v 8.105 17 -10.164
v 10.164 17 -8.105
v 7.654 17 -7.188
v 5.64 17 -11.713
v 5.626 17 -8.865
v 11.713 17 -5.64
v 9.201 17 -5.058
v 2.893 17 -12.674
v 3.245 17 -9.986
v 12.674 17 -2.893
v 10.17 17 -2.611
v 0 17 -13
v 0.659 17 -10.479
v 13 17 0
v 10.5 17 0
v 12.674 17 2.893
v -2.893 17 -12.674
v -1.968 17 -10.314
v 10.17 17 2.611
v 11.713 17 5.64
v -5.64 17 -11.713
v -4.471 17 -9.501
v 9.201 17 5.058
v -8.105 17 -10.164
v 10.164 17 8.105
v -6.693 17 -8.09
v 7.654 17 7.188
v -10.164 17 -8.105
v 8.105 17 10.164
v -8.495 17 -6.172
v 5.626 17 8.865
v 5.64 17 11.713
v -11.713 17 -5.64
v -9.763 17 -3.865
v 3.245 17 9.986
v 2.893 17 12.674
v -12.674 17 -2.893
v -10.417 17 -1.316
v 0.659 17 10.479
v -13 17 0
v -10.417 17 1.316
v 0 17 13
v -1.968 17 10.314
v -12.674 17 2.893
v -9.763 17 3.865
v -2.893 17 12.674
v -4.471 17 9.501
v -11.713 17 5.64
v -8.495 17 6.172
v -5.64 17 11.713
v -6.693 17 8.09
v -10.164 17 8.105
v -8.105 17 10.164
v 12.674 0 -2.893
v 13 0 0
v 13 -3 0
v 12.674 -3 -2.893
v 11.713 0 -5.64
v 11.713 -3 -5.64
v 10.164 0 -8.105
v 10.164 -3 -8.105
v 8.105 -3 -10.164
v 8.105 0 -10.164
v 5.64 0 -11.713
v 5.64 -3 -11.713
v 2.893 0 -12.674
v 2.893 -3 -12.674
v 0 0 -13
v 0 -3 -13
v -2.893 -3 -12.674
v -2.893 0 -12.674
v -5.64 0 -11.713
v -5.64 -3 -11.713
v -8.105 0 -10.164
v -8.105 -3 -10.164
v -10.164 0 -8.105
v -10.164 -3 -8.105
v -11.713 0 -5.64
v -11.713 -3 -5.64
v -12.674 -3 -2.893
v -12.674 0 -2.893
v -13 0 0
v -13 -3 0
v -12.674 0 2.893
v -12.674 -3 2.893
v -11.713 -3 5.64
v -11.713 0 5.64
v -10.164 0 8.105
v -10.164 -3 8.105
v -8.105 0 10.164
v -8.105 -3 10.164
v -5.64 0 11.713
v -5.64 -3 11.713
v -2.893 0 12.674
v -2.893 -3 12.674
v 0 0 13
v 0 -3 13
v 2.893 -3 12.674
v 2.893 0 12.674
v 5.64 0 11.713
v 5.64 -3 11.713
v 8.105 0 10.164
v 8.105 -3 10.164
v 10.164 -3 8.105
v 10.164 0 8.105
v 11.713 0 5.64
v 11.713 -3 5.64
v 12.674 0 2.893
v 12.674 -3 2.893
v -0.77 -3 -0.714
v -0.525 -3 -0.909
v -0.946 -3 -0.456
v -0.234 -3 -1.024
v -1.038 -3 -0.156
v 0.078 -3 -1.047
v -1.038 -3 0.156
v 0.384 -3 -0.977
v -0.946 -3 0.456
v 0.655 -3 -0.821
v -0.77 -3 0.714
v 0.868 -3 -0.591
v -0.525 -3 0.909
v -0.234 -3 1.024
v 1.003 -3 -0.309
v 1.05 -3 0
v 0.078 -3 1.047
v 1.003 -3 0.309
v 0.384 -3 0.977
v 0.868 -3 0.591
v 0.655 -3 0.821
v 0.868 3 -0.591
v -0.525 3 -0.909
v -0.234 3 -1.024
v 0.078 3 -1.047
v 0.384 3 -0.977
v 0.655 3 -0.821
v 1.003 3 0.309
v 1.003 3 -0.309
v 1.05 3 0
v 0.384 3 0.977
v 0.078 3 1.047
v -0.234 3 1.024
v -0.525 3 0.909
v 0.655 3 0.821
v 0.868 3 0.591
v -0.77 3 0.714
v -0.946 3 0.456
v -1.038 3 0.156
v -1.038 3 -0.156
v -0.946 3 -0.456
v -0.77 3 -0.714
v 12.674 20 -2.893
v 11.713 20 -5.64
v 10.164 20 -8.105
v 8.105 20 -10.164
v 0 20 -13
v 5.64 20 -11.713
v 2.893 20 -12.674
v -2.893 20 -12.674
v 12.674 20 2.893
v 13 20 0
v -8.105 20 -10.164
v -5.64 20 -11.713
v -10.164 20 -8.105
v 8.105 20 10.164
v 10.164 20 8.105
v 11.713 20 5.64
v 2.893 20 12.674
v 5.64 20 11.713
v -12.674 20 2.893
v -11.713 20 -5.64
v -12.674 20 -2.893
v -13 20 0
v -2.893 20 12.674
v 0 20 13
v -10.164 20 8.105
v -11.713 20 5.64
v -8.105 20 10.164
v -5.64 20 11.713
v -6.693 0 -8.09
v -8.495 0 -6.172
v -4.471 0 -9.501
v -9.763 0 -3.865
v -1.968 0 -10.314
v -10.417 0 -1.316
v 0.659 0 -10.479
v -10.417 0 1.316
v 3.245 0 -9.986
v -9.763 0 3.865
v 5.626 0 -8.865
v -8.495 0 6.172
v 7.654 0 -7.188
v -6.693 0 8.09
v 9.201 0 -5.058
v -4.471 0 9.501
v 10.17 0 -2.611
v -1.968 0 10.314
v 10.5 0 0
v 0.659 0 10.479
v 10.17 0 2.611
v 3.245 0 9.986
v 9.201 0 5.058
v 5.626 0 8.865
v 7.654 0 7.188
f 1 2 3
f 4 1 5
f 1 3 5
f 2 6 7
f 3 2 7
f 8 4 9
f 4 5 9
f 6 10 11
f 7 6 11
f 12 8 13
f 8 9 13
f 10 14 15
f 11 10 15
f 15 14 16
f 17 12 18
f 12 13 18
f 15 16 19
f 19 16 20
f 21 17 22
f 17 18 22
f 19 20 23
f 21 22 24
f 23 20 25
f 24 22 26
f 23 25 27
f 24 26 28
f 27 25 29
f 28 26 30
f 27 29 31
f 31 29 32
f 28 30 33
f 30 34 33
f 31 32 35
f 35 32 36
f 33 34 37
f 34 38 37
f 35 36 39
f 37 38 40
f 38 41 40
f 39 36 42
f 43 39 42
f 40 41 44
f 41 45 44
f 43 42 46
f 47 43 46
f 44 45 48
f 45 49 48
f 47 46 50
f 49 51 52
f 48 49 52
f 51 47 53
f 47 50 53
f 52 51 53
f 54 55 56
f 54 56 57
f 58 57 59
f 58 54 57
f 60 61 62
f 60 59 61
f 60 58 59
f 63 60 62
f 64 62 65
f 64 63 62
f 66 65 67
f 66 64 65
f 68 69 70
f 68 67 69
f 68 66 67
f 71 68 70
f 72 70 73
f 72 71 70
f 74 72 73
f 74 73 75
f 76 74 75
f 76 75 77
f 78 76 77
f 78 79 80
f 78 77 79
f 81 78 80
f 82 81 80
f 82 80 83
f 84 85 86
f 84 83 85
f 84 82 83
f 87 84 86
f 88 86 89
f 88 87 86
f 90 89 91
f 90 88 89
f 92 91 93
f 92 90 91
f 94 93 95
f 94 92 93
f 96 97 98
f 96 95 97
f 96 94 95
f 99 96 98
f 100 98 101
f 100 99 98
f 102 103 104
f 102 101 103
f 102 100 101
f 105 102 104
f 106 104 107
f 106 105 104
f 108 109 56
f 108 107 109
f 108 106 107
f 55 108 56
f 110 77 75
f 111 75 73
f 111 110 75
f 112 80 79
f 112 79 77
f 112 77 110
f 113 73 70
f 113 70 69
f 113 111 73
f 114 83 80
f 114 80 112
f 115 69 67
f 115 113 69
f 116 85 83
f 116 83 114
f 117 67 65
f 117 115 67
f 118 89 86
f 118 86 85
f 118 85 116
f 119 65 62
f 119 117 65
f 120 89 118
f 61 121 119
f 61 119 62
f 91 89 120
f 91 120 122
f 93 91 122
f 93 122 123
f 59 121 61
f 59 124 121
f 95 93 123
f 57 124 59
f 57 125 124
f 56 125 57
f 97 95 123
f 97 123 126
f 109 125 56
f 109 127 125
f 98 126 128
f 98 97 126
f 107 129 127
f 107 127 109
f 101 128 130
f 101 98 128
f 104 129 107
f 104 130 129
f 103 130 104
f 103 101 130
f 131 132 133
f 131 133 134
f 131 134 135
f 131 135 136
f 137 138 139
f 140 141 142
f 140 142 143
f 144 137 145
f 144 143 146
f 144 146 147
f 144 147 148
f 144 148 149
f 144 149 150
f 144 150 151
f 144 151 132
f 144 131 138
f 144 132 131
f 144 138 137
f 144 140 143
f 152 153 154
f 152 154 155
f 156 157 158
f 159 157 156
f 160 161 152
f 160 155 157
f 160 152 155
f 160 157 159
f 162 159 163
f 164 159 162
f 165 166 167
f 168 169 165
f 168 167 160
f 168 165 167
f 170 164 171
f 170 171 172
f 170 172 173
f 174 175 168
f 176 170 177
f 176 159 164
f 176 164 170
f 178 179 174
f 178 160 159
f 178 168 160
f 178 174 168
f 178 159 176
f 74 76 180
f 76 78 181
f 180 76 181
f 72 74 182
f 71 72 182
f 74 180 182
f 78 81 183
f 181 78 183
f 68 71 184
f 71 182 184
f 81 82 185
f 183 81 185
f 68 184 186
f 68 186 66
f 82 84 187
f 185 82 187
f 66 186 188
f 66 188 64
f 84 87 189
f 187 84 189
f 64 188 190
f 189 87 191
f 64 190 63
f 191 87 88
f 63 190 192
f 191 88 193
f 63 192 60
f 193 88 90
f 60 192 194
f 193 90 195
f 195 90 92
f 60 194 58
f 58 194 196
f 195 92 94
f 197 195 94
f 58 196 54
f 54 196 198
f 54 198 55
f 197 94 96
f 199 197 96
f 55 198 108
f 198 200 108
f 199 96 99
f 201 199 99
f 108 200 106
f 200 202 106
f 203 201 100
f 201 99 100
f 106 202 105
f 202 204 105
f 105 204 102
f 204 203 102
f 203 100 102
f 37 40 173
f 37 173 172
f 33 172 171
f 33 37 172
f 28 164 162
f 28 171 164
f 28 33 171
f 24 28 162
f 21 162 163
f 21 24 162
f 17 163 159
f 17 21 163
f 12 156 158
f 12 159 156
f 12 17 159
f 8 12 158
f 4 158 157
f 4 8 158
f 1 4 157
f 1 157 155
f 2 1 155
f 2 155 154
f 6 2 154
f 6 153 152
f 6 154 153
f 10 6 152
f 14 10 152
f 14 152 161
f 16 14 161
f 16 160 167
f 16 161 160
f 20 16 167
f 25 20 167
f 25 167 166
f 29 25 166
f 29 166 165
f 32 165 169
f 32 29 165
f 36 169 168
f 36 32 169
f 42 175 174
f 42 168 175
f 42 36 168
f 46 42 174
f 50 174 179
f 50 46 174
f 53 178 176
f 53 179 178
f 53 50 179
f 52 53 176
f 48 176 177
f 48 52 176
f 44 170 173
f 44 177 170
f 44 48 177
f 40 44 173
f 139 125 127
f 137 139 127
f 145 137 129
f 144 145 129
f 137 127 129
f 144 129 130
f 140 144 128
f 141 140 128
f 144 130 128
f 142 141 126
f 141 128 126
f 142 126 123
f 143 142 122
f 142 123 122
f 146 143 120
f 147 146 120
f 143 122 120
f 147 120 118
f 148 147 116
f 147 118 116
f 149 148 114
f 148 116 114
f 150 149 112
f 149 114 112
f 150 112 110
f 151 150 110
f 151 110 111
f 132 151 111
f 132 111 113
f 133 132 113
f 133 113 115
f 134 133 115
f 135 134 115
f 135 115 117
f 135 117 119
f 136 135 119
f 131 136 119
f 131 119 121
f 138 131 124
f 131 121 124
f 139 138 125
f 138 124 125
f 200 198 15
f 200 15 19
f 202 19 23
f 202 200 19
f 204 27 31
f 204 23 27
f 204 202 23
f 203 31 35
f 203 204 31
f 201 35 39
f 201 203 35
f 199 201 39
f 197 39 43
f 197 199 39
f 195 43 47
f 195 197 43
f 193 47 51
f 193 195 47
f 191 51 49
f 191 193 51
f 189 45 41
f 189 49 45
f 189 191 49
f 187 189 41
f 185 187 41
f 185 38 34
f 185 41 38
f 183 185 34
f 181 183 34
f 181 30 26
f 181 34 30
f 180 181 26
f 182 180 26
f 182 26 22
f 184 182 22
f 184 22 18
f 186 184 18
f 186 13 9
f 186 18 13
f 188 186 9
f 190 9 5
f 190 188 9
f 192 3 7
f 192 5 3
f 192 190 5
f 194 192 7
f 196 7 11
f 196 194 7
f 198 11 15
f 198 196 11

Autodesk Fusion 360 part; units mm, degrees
sketch "Sketch1" plane through (0, 0, 0) normal (0, 1, 0) x (1, 0, 0)
  circle A0 centre (0, 0) radius 10.5
  dimension "d1" = 21
extrude "Extrude1" add sketch "Sketch1" along normal blind 17
sketch "Sketch2" plane through (0, 0, 0) normal (0, -1, 0) x (1, 0, 0)
  circle A0 centre (0, 0) radius 10.5
  circle A1 centre (0, 0) radius 13
  dimension "d4" = 26
extrude "Extrude2" add sketch "Sketch2" along normal blind 3 contours A0 | A1
sketch "Sketch3" plane through (0, 17, 0) normal (0, 1, 0) x (-1, 0, 0)
  circle A0 centre (0, 0) radius 10.5
  circle A1 centre (0, 0) radius 13
  dimension "d7" = 26
extrude "Extrude3" add sketch "Sketch3" along normal blind 3 contours A0 | A1
sketch "Sketch4" plane through (0, -3, 0) normal (0, -1, 0) x (1, 0, 0)
  circle A0 centre (0, 0) radius 13
  circle A1 centre (0, 0) radius 1.05
  dimension "d10" = 2.1
extrude "Extrude4" cut sketch "Sketch4" against normal blind 6 contours A1
